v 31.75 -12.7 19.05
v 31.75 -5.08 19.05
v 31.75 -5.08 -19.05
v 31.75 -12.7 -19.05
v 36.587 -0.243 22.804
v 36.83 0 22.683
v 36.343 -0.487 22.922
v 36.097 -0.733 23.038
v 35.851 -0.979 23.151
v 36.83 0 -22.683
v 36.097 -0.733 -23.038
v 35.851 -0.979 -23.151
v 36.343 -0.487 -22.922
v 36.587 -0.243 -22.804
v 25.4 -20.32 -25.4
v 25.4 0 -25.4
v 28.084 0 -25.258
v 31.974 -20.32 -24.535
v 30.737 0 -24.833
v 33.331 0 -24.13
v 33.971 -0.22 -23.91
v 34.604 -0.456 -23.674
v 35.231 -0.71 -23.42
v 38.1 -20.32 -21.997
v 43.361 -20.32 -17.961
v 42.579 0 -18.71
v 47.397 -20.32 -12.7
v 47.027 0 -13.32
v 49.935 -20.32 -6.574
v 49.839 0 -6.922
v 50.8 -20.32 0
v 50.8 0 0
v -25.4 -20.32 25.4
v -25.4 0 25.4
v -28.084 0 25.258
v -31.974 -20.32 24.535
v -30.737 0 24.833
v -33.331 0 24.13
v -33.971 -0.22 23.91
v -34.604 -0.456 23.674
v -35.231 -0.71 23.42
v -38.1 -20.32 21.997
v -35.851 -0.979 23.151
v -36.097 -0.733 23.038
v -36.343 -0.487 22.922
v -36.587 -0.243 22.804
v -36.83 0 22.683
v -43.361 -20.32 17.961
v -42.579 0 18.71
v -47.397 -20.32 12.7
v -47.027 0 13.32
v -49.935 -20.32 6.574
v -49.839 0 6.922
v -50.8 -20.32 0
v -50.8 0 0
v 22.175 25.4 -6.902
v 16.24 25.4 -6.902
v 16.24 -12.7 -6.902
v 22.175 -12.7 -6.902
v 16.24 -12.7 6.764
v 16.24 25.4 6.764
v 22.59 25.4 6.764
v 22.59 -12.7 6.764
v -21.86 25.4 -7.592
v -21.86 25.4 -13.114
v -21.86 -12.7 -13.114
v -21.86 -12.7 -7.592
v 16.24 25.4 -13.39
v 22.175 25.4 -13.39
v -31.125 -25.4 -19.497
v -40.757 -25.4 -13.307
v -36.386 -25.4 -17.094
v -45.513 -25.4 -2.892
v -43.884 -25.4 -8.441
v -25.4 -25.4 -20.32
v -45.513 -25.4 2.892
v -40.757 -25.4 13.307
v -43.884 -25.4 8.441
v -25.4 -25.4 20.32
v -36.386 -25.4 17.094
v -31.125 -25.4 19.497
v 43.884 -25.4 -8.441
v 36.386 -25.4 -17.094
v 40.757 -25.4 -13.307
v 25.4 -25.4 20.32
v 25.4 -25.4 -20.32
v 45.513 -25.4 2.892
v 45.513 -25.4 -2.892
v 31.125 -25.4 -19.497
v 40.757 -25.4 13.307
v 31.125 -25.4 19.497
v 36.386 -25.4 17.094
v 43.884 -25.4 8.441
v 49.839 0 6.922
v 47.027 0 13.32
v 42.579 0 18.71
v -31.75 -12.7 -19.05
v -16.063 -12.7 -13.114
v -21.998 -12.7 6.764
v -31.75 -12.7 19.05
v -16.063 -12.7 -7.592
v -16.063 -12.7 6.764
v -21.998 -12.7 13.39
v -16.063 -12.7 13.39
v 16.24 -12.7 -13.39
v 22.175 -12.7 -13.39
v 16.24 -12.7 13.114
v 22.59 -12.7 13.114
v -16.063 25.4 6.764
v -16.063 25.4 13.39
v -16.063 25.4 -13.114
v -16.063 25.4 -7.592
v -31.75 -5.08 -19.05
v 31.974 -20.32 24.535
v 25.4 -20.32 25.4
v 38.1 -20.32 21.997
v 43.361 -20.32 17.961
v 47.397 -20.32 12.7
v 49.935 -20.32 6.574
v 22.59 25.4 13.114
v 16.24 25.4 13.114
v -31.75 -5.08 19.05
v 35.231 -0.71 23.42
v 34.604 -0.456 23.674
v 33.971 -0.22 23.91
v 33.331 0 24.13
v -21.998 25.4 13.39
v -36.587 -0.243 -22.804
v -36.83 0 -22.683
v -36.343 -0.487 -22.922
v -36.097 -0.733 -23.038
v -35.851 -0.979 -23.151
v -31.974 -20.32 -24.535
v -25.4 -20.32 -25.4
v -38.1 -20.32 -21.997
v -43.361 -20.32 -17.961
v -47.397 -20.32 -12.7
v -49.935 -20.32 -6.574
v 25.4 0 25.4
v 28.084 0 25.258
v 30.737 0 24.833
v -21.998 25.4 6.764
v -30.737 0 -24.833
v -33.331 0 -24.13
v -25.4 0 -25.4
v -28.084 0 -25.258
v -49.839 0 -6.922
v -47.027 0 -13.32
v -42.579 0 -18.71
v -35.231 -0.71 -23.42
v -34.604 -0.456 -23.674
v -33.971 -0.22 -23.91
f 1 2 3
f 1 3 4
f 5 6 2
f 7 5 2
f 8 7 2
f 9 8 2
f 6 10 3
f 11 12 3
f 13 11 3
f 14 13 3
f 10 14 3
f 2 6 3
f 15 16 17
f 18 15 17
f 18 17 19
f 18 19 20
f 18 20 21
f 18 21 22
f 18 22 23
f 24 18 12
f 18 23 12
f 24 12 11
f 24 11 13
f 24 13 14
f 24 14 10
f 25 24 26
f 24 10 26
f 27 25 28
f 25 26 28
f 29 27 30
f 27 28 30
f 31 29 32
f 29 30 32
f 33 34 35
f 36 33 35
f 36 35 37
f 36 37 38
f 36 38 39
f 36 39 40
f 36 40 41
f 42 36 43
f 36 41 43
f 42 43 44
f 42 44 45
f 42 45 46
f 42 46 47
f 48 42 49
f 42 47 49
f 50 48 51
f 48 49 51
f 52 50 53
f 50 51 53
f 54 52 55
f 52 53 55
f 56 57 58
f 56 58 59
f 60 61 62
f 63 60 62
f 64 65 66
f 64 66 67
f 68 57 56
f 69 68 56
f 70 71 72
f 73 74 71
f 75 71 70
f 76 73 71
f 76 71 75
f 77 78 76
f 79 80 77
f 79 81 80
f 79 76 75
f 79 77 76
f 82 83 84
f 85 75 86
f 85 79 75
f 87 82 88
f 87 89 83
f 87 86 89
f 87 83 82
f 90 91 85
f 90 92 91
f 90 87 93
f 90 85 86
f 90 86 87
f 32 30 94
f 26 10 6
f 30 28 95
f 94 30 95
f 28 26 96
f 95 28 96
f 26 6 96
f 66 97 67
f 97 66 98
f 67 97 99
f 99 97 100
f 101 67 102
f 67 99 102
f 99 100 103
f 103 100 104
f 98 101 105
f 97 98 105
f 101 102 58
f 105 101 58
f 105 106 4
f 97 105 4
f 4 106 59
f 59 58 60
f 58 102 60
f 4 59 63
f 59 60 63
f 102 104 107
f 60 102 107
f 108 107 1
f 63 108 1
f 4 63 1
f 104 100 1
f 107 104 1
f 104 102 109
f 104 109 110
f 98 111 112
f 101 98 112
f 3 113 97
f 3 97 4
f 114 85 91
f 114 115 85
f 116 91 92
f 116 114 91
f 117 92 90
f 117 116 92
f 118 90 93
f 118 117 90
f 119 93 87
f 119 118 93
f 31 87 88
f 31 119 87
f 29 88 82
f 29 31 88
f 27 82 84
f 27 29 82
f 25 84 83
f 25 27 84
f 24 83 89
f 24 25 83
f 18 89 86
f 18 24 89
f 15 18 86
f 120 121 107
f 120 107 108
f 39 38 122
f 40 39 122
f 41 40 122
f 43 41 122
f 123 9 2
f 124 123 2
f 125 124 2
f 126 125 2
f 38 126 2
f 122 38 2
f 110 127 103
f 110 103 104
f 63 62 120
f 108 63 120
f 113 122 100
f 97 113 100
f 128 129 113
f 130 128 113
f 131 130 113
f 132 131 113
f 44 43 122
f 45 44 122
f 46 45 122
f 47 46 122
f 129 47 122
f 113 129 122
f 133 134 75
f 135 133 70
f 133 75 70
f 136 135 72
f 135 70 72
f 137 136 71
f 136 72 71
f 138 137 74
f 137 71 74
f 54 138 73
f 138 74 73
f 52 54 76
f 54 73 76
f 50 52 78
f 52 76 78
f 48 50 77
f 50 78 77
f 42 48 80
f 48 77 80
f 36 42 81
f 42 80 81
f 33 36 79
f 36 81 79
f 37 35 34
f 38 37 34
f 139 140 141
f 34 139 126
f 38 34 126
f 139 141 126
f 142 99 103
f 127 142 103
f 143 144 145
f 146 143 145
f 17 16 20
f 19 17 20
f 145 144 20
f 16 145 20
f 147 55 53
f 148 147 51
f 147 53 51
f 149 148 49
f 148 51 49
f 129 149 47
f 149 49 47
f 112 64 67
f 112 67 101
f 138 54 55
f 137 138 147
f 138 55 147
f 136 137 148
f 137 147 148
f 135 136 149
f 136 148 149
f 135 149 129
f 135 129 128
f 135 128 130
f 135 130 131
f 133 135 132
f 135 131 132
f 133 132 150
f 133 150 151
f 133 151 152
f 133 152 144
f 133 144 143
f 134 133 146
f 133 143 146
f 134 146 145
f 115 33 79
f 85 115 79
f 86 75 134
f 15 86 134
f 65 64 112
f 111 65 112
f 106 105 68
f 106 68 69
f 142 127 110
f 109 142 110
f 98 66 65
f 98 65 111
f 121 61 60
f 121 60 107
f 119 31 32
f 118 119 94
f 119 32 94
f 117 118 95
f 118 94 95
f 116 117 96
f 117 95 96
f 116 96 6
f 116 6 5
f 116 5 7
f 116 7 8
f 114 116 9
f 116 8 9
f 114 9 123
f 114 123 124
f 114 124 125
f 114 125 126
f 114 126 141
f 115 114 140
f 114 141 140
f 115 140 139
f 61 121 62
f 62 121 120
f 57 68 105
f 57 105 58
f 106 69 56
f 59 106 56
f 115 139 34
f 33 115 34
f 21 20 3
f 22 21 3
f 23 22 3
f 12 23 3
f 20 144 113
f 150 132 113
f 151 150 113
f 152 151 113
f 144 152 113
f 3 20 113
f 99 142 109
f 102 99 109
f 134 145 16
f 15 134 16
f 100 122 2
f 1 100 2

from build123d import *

# Parameters (mm, degrees)
F1_DEPTH     = 25.4
F2_W         = 63.5
F2_H         = 38.1
F3_DEPTH     = 12.7
F4_T1_DEPTH  = 63.5
F4_T3_DEPTH  = 38.1
F4_T5_DEPTH  = 50.8
F4_T8_ANGLE  = 180
F4_T10_ANGLE = 180
F4_T15_DEPTH = 76.5641495789
F4_S16_R     = 25.4
F4_T17_DEPTH = 40
F4_T21_DEPTH = 51.1641495789
F4_S22_R     = 25.4
F4_T23_DEPTH = 27
F4_T30_DEPTH = 76.5641495789
F4_S31_R     = 25.4
F4_T32_DEPTH = 40
F4_T36_DEPTH = 51.1641495789
F4_S37_R     = 25.4
F4_T38_DEPTH = 27
F4_T45_DEPTH = 51.1641495789
F4_S46_R     = 25.4
F4_T47_DEPTH = 27
F4_T51_DEPTH = 76.5641495789
F4_S52_R     = 25.4
F4_T53_DEPTH = 40
F4_T60_DEPTH = 76.5641495789
F4_S61_R     = 25.4
F4_T62_DEPTH = 40
F4_T66_DEPTH = 51.1641495789
F4_S67_R     = 25.4
F4_T68_DEPTH = 27
F5_W         = 6.35
F5_H         = 6.35
F5_W_2       = 5.9358693383
F5_H_2       = 6.4880426841
F5_W_3       = 5.79782274
F5_H_3       = 5.521739329
F5_W_4       = 5.9358680336
F5_H_4       = 6.6260866729
F6_DEPTH     = 25.4


# Not quite as in the source:
# - a fillet or chamfer that OpenCascade refuses, or shapes differently, is made with other operations: its cross-section is extruded or revolved along the edge and cut away or added


with BuildPart() as f1:
    # F0 (on Front) → F1 (new body)
    with BuildSketch(Plane.XZ):
        with BuildLine():
            ThreePointArc((-50.8, 0), (-43.3605122421, -17.9605122421), (-25.4, -25.4))
            Line((-25.4, -25.4), (25.4, -25.4))
            ThreePointArc((25.4, -25.4), (43.3605122421, -17.9605122421), (50.8, 0))
            ThreePointArc((50.8, 0), (43.3605122421, 17.9605122421), (25.4, 25.4))
            Line((25.4, 25.4), (-25.4, 25.4))
            ThreePointArc((-25.4, 25.4), (-43.3605122421, 17.9605122421), (-50.8, 0))
        make_face()
    extrude(amount=F1_DEPTH)

    # F2 (on Front) → F3 (cut)
    with BuildSketch(Plane.XZ):
        Rectangle(F2_W, F2_H)
    extrude(amount=F3_DEPTH, mode=Mode.SUBTRACT)

    # F4: chamfer of 5.08 on 8 edges, made by hand

    # F4_s2 → F4_t1 (cut)
    with BuildSketch(Plane.YZ.offset(-31.75)):
        Polygon((0, 24.13), (-5.08, 19.05), (0, 19.05), align=None)
        Polygon((0, -24.13), (-5.08, -19.05), (0, -19.05), align=None)
    extrude(amount=F4_T1_DEPTH, mode=Mode.SUBTRACT)

    # F4_s4 → F4_t3 (cut)
    with BuildSketch(Plane.XY.offset(-19.05)):
        Polygon((-36.83, 0), (-31.75, -5.08), (-31.75, 0), align=None)
        Polygon((36.83, 0), (31.75, -5.08), (31.75, 0), align=None)
    extrude(amount=F4_T3_DEPTH, mode=Mode.SUBTRACT)

    # F4_s6 → F4_t5 (cut)
    with BuildSketch(Plane.YZ.offset(-25.4)):
        Polygon((-20.32, 25.4), (-25.4, 20.32), (-25.4, 25.4), align=None)
        Polygon((-25.4, -20.32), (-20.32, -25.4), (-25.4, -25.4), align=None)
    extrude(amount=F4_T5_DEPTH, mode=Mode.SUBTRACT)

    # F4_s7 → F4_t8 (revolve, cut)
    with BuildSketch(Plane.YZ.offset(-25.4)):
        Polygon((-20.32, -25.4), (-25.4, -20.32), (-25.4, -25.4), align=None)
    revolve(axis=Axis((-25.4, -25.4, 0), (0, 1, 0)), revolution_arc=F4_T8_ANGLE, mode=Mode.SUBTRACT)

    # F4_s9 → F4_t10 (revolve, cut)
    with BuildSketch(Plane.YZ.offset(25.4)):
        Polygon((-25.4, 20.32), (-20.32, 25.4), (-25.4, 25.4), align=None)
    revolve(axis=Axis((25.4, -25.4, 0), (0, 1, 0)), revolution_arc=F4_T10_ANGLE, mode=Mode.SUBTRACT)


with BuildPart() as f4_tool13:
    # F4_s14 → F4_t15 (new body)
    with BuildSketch(Plane.YZ.offset(44.8141495789)):
        Polygon((0, 24.13), (-5.08, 19.05), (0, 19.05), align=None)
    extrude(amount=-F4_T15_DEPTH)

    # F4_s16 → F4_t17 (intersect, symmetric)
    with BuildSketch(Plane.XZ.offset(2.5)):
        with Locations((25.4, 0)):
            Circle(F4_S16_R)
    extrude(amount=F4_T17_DEPTH, both=True, mode=Mode.INTERSECT)

    split(bisect_by=Plane.YZ.offset(31.75), keep=Keep.TOP)


with BuildPart() as f4_tool19:
    # F4_s20 → F4_t21 (new body)
    with BuildSketch(Plane.XY.offset(-19.05)):
        Polygon((36.83, 0), (31.75, -5.08), (31.75, 0), align=None)
    extrude(amount=F4_T21_DEPTH)

    # F4_s22 → F4_t23 (intersect, symmetric)
    with BuildSketch(Plane.XZ.offset(2.5)):
        with Locations((25.4, 0)):
            Circle(F4_S22_R)
    extrude(amount=F4_T23_DEPTH, both=True, mode=Mode.INTERSECT)

    split(bisect_by=Plane.XY.offset(19.05), keep=Keep.TOP)


with BuildPart() as f4_tool13_1:
    add(f4_tool13.part)

    # F4_t25: intersect F4_tool19
    add(f4_tool19.part, mode=Mode.INTERSECT)


with BuildPart() as f1_1:
    add(f1.part)

    # F4_t11: cut F4_tool13
    add(f4_tool13_1.part, mode=Mode.SUBTRACT)


with BuildPart() as f4_tool28:
    # F4_s29 → F4_t30 (new body)
    with BuildSketch(Plane.YZ.offset(31.75)):
        Polygon((0, 24.13), (-5.08, 19.05), (0, 19.05), align=None)
    extrude(amount=-F4_T30_DEPTH)

    # F4_s31 → F4_t32 (intersect, symmetric)
    with BuildSketch(Plane.XZ.offset(2.5)):
        with Locations((-25.4, 0)):
            Circle(F4_S31_R)
    extrude(amount=F4_T32_DEPTH, both=True, mode=Mode.INTERSECT)

    split(bisect_by=Plane.YZ.offset(-31.75), keep=Keep.BOTTOM)


with BuildPart() as f4_tool34:
    # F4_s35 → F4_t36 (new body)
    with BuildSketch(Plane.XY.offset(32.1141495789)):
        Polygon((-36.83, 0), (-31.75, -5.08), (-31.75, 0), align=None)
    extrude(amount=-F4_T36_DEPTH)

    # F4_s37 → F4_t38 (intersect, symmetric)
    with BuildSketch(Plane.XZ.offset(2.5)):
        with Locations((-25.4, 0)):
            Circle(F4_S37_R)
    extrude(amount=F4_T38_DEPTH, both=True, mode=Mode.INTERSECT)

    split(bisect_by=Plane.XY.offset(19.05), keep=Keep.TOP)


with BuildPart() as f4_tool28_1:
    add(f4_tool28.part)

    # F4_t40: intersect F4_tool34
    add(f4_tool34.part, mode=Mode.INTERSECT)


with BuildPart() as f1_2:
    add(f1_1.part)

    # F4_t26: cut F4_tool28
    add(f4_tool28_1.part, mode=Mode.SUBTRACT)


with BuildPart() as f4_tool43:
    # F4_s44 → F4_t45 (new body)
    with BuildSketch(Plane.XY.offset(19.05)):
        Polygon((-36.83, 0), (-31.75, -5.08), (-31.75, 0), align=None)
    extrude(amount=-F4_T45_DEPTH)

    # F4_s46 → F4_t47 (intersect, symmetric)
    with BuildSketch(Plane.XZ.offset(2.5)):
        with Locations((-25.4, 0)):
            Circle(F4_S46_R)
    extrude(amount=F4_T47_DEPTH, both=True, mode=Mode.INTERSECT)

    split(bisect_by=Plane.XY.offset(-19.05), keep=Keep.BOTTOM)


with BuildPart() as f4_tool49:
    # F4_s50 → F4_t51 (new body)
    with BuildSketch(Plane.YZ.offset(-44.8141495789)):
        Polygon((0, -24.13), (-5.08, -19.05), (0, -19.05), align=None)
    extrude(amount=F4_T51_DEPTH)

    # F4_s52 → F4_t53 (intersect, symmetric)
    with BuildSketch(Plane.XZ.offset(2.5)):
        with Locations((-25.4, 0)):
            Circle(F4_S52_R)
    extrude(amount=F4_T53_DEPTH, both=True, mode=Mode.INTERSECT)

    split(bisect_by=Plane.YZ.offset(-31.75), keep=Keep.BOTTOM)


with BuildPart() as f4_tool43_1:
    add(f4_tool43.part)

    # F4_t55: intersect F4_tool49
    add(f4_tool49.part, mode=Mode.INTERSECT)


with BuildPart() as f1_3:
    add(f1_2.part)

    # F4_t41: cut F4_tool43
    add(f4_tool43_1.part, mode=Mode.SUBTRACT)


with BuildPart() as f4_tool58:
    # F4_s59 → F4_t60 (new body)
    with BuildSketch(Plane.YZ.offset(-31.75)):
        Polygon((0, -24.13), (-5.08, -19.05), (0, -19.05), align=None)
    extrude(amount=F4_T60_DEPTH)

    # F4_s61 → F4_t62 (intersect, symmetric)
    with BuildSketch(Plane.XZ.offset(2.5)):
        with Locations((25.4, 0)):
            Circle(F4_S61_R)
    extrude(amount=F4_T62_DEPTH, both=True, mode=Mode.INTERSECT)

    split(bisect_by=Plane.YZ.offset(31.75), keep=Keep.TOP)


with BuildPart() as f4_tool64:
    # F4_s65 → F4_t66 (new body)
    with BuildSketch(Plane.XY.offset(-32.1141495789)):
        Polygon((36.83, 0), (31.75, -5.08), (31.75, 0), align=None)
    extrude(amount=F4_T66_DEPTH)

    # F4_s67 → F4_t68 (intersect, symmetric)
    with BuildSketch(Plane.XZ.offset(2.5)):
        with Locations((25.4, 0)):
            Circle(F4_S67_R)
    extrude(amount=F4_T68_DEPTH, both=True, mode=Mode.INTERSECT)

    split(bisect_by=Plane.XY.offset(-19.05), keep=Keep.BOTTOM)


with BuildPart() as f4_tool58_1:
    add(f4_tool58.part)

    # F4_t70: intersect F4_tool64
    add(f4_tool64.part, mode=Mode.INTERSECT)


with BuildPart() as f1_4:
    add(f1_3.part)

    # F4_t56: cut F4_tool58
    add(f4_tool58_1.part, mode=Mode.SUBTRACT)

    # F5 (on Front) → F6 (join, symmetric)
    with BuildSketch(Plane.XZ):
        with Locations((19.4146236851, 9.9391293569)):
            Rectangle(F5_W, F5_H)
        with Locations((19.2075583543, -10.1461946878)):
            Rectangle(F5_W_2, F5_H_2)
        with Locations((-18.9614597259, -10.3532596925)):
            Rectangle(F5_W_3, F5_H_3)
        with Locations((-19.0304823727, 10.0771726934)):
            Rectangle(F5_W_4, F5_H_4)
    extrude(amount=F6_DEPTH, both=True)


solid = f1_4.part
